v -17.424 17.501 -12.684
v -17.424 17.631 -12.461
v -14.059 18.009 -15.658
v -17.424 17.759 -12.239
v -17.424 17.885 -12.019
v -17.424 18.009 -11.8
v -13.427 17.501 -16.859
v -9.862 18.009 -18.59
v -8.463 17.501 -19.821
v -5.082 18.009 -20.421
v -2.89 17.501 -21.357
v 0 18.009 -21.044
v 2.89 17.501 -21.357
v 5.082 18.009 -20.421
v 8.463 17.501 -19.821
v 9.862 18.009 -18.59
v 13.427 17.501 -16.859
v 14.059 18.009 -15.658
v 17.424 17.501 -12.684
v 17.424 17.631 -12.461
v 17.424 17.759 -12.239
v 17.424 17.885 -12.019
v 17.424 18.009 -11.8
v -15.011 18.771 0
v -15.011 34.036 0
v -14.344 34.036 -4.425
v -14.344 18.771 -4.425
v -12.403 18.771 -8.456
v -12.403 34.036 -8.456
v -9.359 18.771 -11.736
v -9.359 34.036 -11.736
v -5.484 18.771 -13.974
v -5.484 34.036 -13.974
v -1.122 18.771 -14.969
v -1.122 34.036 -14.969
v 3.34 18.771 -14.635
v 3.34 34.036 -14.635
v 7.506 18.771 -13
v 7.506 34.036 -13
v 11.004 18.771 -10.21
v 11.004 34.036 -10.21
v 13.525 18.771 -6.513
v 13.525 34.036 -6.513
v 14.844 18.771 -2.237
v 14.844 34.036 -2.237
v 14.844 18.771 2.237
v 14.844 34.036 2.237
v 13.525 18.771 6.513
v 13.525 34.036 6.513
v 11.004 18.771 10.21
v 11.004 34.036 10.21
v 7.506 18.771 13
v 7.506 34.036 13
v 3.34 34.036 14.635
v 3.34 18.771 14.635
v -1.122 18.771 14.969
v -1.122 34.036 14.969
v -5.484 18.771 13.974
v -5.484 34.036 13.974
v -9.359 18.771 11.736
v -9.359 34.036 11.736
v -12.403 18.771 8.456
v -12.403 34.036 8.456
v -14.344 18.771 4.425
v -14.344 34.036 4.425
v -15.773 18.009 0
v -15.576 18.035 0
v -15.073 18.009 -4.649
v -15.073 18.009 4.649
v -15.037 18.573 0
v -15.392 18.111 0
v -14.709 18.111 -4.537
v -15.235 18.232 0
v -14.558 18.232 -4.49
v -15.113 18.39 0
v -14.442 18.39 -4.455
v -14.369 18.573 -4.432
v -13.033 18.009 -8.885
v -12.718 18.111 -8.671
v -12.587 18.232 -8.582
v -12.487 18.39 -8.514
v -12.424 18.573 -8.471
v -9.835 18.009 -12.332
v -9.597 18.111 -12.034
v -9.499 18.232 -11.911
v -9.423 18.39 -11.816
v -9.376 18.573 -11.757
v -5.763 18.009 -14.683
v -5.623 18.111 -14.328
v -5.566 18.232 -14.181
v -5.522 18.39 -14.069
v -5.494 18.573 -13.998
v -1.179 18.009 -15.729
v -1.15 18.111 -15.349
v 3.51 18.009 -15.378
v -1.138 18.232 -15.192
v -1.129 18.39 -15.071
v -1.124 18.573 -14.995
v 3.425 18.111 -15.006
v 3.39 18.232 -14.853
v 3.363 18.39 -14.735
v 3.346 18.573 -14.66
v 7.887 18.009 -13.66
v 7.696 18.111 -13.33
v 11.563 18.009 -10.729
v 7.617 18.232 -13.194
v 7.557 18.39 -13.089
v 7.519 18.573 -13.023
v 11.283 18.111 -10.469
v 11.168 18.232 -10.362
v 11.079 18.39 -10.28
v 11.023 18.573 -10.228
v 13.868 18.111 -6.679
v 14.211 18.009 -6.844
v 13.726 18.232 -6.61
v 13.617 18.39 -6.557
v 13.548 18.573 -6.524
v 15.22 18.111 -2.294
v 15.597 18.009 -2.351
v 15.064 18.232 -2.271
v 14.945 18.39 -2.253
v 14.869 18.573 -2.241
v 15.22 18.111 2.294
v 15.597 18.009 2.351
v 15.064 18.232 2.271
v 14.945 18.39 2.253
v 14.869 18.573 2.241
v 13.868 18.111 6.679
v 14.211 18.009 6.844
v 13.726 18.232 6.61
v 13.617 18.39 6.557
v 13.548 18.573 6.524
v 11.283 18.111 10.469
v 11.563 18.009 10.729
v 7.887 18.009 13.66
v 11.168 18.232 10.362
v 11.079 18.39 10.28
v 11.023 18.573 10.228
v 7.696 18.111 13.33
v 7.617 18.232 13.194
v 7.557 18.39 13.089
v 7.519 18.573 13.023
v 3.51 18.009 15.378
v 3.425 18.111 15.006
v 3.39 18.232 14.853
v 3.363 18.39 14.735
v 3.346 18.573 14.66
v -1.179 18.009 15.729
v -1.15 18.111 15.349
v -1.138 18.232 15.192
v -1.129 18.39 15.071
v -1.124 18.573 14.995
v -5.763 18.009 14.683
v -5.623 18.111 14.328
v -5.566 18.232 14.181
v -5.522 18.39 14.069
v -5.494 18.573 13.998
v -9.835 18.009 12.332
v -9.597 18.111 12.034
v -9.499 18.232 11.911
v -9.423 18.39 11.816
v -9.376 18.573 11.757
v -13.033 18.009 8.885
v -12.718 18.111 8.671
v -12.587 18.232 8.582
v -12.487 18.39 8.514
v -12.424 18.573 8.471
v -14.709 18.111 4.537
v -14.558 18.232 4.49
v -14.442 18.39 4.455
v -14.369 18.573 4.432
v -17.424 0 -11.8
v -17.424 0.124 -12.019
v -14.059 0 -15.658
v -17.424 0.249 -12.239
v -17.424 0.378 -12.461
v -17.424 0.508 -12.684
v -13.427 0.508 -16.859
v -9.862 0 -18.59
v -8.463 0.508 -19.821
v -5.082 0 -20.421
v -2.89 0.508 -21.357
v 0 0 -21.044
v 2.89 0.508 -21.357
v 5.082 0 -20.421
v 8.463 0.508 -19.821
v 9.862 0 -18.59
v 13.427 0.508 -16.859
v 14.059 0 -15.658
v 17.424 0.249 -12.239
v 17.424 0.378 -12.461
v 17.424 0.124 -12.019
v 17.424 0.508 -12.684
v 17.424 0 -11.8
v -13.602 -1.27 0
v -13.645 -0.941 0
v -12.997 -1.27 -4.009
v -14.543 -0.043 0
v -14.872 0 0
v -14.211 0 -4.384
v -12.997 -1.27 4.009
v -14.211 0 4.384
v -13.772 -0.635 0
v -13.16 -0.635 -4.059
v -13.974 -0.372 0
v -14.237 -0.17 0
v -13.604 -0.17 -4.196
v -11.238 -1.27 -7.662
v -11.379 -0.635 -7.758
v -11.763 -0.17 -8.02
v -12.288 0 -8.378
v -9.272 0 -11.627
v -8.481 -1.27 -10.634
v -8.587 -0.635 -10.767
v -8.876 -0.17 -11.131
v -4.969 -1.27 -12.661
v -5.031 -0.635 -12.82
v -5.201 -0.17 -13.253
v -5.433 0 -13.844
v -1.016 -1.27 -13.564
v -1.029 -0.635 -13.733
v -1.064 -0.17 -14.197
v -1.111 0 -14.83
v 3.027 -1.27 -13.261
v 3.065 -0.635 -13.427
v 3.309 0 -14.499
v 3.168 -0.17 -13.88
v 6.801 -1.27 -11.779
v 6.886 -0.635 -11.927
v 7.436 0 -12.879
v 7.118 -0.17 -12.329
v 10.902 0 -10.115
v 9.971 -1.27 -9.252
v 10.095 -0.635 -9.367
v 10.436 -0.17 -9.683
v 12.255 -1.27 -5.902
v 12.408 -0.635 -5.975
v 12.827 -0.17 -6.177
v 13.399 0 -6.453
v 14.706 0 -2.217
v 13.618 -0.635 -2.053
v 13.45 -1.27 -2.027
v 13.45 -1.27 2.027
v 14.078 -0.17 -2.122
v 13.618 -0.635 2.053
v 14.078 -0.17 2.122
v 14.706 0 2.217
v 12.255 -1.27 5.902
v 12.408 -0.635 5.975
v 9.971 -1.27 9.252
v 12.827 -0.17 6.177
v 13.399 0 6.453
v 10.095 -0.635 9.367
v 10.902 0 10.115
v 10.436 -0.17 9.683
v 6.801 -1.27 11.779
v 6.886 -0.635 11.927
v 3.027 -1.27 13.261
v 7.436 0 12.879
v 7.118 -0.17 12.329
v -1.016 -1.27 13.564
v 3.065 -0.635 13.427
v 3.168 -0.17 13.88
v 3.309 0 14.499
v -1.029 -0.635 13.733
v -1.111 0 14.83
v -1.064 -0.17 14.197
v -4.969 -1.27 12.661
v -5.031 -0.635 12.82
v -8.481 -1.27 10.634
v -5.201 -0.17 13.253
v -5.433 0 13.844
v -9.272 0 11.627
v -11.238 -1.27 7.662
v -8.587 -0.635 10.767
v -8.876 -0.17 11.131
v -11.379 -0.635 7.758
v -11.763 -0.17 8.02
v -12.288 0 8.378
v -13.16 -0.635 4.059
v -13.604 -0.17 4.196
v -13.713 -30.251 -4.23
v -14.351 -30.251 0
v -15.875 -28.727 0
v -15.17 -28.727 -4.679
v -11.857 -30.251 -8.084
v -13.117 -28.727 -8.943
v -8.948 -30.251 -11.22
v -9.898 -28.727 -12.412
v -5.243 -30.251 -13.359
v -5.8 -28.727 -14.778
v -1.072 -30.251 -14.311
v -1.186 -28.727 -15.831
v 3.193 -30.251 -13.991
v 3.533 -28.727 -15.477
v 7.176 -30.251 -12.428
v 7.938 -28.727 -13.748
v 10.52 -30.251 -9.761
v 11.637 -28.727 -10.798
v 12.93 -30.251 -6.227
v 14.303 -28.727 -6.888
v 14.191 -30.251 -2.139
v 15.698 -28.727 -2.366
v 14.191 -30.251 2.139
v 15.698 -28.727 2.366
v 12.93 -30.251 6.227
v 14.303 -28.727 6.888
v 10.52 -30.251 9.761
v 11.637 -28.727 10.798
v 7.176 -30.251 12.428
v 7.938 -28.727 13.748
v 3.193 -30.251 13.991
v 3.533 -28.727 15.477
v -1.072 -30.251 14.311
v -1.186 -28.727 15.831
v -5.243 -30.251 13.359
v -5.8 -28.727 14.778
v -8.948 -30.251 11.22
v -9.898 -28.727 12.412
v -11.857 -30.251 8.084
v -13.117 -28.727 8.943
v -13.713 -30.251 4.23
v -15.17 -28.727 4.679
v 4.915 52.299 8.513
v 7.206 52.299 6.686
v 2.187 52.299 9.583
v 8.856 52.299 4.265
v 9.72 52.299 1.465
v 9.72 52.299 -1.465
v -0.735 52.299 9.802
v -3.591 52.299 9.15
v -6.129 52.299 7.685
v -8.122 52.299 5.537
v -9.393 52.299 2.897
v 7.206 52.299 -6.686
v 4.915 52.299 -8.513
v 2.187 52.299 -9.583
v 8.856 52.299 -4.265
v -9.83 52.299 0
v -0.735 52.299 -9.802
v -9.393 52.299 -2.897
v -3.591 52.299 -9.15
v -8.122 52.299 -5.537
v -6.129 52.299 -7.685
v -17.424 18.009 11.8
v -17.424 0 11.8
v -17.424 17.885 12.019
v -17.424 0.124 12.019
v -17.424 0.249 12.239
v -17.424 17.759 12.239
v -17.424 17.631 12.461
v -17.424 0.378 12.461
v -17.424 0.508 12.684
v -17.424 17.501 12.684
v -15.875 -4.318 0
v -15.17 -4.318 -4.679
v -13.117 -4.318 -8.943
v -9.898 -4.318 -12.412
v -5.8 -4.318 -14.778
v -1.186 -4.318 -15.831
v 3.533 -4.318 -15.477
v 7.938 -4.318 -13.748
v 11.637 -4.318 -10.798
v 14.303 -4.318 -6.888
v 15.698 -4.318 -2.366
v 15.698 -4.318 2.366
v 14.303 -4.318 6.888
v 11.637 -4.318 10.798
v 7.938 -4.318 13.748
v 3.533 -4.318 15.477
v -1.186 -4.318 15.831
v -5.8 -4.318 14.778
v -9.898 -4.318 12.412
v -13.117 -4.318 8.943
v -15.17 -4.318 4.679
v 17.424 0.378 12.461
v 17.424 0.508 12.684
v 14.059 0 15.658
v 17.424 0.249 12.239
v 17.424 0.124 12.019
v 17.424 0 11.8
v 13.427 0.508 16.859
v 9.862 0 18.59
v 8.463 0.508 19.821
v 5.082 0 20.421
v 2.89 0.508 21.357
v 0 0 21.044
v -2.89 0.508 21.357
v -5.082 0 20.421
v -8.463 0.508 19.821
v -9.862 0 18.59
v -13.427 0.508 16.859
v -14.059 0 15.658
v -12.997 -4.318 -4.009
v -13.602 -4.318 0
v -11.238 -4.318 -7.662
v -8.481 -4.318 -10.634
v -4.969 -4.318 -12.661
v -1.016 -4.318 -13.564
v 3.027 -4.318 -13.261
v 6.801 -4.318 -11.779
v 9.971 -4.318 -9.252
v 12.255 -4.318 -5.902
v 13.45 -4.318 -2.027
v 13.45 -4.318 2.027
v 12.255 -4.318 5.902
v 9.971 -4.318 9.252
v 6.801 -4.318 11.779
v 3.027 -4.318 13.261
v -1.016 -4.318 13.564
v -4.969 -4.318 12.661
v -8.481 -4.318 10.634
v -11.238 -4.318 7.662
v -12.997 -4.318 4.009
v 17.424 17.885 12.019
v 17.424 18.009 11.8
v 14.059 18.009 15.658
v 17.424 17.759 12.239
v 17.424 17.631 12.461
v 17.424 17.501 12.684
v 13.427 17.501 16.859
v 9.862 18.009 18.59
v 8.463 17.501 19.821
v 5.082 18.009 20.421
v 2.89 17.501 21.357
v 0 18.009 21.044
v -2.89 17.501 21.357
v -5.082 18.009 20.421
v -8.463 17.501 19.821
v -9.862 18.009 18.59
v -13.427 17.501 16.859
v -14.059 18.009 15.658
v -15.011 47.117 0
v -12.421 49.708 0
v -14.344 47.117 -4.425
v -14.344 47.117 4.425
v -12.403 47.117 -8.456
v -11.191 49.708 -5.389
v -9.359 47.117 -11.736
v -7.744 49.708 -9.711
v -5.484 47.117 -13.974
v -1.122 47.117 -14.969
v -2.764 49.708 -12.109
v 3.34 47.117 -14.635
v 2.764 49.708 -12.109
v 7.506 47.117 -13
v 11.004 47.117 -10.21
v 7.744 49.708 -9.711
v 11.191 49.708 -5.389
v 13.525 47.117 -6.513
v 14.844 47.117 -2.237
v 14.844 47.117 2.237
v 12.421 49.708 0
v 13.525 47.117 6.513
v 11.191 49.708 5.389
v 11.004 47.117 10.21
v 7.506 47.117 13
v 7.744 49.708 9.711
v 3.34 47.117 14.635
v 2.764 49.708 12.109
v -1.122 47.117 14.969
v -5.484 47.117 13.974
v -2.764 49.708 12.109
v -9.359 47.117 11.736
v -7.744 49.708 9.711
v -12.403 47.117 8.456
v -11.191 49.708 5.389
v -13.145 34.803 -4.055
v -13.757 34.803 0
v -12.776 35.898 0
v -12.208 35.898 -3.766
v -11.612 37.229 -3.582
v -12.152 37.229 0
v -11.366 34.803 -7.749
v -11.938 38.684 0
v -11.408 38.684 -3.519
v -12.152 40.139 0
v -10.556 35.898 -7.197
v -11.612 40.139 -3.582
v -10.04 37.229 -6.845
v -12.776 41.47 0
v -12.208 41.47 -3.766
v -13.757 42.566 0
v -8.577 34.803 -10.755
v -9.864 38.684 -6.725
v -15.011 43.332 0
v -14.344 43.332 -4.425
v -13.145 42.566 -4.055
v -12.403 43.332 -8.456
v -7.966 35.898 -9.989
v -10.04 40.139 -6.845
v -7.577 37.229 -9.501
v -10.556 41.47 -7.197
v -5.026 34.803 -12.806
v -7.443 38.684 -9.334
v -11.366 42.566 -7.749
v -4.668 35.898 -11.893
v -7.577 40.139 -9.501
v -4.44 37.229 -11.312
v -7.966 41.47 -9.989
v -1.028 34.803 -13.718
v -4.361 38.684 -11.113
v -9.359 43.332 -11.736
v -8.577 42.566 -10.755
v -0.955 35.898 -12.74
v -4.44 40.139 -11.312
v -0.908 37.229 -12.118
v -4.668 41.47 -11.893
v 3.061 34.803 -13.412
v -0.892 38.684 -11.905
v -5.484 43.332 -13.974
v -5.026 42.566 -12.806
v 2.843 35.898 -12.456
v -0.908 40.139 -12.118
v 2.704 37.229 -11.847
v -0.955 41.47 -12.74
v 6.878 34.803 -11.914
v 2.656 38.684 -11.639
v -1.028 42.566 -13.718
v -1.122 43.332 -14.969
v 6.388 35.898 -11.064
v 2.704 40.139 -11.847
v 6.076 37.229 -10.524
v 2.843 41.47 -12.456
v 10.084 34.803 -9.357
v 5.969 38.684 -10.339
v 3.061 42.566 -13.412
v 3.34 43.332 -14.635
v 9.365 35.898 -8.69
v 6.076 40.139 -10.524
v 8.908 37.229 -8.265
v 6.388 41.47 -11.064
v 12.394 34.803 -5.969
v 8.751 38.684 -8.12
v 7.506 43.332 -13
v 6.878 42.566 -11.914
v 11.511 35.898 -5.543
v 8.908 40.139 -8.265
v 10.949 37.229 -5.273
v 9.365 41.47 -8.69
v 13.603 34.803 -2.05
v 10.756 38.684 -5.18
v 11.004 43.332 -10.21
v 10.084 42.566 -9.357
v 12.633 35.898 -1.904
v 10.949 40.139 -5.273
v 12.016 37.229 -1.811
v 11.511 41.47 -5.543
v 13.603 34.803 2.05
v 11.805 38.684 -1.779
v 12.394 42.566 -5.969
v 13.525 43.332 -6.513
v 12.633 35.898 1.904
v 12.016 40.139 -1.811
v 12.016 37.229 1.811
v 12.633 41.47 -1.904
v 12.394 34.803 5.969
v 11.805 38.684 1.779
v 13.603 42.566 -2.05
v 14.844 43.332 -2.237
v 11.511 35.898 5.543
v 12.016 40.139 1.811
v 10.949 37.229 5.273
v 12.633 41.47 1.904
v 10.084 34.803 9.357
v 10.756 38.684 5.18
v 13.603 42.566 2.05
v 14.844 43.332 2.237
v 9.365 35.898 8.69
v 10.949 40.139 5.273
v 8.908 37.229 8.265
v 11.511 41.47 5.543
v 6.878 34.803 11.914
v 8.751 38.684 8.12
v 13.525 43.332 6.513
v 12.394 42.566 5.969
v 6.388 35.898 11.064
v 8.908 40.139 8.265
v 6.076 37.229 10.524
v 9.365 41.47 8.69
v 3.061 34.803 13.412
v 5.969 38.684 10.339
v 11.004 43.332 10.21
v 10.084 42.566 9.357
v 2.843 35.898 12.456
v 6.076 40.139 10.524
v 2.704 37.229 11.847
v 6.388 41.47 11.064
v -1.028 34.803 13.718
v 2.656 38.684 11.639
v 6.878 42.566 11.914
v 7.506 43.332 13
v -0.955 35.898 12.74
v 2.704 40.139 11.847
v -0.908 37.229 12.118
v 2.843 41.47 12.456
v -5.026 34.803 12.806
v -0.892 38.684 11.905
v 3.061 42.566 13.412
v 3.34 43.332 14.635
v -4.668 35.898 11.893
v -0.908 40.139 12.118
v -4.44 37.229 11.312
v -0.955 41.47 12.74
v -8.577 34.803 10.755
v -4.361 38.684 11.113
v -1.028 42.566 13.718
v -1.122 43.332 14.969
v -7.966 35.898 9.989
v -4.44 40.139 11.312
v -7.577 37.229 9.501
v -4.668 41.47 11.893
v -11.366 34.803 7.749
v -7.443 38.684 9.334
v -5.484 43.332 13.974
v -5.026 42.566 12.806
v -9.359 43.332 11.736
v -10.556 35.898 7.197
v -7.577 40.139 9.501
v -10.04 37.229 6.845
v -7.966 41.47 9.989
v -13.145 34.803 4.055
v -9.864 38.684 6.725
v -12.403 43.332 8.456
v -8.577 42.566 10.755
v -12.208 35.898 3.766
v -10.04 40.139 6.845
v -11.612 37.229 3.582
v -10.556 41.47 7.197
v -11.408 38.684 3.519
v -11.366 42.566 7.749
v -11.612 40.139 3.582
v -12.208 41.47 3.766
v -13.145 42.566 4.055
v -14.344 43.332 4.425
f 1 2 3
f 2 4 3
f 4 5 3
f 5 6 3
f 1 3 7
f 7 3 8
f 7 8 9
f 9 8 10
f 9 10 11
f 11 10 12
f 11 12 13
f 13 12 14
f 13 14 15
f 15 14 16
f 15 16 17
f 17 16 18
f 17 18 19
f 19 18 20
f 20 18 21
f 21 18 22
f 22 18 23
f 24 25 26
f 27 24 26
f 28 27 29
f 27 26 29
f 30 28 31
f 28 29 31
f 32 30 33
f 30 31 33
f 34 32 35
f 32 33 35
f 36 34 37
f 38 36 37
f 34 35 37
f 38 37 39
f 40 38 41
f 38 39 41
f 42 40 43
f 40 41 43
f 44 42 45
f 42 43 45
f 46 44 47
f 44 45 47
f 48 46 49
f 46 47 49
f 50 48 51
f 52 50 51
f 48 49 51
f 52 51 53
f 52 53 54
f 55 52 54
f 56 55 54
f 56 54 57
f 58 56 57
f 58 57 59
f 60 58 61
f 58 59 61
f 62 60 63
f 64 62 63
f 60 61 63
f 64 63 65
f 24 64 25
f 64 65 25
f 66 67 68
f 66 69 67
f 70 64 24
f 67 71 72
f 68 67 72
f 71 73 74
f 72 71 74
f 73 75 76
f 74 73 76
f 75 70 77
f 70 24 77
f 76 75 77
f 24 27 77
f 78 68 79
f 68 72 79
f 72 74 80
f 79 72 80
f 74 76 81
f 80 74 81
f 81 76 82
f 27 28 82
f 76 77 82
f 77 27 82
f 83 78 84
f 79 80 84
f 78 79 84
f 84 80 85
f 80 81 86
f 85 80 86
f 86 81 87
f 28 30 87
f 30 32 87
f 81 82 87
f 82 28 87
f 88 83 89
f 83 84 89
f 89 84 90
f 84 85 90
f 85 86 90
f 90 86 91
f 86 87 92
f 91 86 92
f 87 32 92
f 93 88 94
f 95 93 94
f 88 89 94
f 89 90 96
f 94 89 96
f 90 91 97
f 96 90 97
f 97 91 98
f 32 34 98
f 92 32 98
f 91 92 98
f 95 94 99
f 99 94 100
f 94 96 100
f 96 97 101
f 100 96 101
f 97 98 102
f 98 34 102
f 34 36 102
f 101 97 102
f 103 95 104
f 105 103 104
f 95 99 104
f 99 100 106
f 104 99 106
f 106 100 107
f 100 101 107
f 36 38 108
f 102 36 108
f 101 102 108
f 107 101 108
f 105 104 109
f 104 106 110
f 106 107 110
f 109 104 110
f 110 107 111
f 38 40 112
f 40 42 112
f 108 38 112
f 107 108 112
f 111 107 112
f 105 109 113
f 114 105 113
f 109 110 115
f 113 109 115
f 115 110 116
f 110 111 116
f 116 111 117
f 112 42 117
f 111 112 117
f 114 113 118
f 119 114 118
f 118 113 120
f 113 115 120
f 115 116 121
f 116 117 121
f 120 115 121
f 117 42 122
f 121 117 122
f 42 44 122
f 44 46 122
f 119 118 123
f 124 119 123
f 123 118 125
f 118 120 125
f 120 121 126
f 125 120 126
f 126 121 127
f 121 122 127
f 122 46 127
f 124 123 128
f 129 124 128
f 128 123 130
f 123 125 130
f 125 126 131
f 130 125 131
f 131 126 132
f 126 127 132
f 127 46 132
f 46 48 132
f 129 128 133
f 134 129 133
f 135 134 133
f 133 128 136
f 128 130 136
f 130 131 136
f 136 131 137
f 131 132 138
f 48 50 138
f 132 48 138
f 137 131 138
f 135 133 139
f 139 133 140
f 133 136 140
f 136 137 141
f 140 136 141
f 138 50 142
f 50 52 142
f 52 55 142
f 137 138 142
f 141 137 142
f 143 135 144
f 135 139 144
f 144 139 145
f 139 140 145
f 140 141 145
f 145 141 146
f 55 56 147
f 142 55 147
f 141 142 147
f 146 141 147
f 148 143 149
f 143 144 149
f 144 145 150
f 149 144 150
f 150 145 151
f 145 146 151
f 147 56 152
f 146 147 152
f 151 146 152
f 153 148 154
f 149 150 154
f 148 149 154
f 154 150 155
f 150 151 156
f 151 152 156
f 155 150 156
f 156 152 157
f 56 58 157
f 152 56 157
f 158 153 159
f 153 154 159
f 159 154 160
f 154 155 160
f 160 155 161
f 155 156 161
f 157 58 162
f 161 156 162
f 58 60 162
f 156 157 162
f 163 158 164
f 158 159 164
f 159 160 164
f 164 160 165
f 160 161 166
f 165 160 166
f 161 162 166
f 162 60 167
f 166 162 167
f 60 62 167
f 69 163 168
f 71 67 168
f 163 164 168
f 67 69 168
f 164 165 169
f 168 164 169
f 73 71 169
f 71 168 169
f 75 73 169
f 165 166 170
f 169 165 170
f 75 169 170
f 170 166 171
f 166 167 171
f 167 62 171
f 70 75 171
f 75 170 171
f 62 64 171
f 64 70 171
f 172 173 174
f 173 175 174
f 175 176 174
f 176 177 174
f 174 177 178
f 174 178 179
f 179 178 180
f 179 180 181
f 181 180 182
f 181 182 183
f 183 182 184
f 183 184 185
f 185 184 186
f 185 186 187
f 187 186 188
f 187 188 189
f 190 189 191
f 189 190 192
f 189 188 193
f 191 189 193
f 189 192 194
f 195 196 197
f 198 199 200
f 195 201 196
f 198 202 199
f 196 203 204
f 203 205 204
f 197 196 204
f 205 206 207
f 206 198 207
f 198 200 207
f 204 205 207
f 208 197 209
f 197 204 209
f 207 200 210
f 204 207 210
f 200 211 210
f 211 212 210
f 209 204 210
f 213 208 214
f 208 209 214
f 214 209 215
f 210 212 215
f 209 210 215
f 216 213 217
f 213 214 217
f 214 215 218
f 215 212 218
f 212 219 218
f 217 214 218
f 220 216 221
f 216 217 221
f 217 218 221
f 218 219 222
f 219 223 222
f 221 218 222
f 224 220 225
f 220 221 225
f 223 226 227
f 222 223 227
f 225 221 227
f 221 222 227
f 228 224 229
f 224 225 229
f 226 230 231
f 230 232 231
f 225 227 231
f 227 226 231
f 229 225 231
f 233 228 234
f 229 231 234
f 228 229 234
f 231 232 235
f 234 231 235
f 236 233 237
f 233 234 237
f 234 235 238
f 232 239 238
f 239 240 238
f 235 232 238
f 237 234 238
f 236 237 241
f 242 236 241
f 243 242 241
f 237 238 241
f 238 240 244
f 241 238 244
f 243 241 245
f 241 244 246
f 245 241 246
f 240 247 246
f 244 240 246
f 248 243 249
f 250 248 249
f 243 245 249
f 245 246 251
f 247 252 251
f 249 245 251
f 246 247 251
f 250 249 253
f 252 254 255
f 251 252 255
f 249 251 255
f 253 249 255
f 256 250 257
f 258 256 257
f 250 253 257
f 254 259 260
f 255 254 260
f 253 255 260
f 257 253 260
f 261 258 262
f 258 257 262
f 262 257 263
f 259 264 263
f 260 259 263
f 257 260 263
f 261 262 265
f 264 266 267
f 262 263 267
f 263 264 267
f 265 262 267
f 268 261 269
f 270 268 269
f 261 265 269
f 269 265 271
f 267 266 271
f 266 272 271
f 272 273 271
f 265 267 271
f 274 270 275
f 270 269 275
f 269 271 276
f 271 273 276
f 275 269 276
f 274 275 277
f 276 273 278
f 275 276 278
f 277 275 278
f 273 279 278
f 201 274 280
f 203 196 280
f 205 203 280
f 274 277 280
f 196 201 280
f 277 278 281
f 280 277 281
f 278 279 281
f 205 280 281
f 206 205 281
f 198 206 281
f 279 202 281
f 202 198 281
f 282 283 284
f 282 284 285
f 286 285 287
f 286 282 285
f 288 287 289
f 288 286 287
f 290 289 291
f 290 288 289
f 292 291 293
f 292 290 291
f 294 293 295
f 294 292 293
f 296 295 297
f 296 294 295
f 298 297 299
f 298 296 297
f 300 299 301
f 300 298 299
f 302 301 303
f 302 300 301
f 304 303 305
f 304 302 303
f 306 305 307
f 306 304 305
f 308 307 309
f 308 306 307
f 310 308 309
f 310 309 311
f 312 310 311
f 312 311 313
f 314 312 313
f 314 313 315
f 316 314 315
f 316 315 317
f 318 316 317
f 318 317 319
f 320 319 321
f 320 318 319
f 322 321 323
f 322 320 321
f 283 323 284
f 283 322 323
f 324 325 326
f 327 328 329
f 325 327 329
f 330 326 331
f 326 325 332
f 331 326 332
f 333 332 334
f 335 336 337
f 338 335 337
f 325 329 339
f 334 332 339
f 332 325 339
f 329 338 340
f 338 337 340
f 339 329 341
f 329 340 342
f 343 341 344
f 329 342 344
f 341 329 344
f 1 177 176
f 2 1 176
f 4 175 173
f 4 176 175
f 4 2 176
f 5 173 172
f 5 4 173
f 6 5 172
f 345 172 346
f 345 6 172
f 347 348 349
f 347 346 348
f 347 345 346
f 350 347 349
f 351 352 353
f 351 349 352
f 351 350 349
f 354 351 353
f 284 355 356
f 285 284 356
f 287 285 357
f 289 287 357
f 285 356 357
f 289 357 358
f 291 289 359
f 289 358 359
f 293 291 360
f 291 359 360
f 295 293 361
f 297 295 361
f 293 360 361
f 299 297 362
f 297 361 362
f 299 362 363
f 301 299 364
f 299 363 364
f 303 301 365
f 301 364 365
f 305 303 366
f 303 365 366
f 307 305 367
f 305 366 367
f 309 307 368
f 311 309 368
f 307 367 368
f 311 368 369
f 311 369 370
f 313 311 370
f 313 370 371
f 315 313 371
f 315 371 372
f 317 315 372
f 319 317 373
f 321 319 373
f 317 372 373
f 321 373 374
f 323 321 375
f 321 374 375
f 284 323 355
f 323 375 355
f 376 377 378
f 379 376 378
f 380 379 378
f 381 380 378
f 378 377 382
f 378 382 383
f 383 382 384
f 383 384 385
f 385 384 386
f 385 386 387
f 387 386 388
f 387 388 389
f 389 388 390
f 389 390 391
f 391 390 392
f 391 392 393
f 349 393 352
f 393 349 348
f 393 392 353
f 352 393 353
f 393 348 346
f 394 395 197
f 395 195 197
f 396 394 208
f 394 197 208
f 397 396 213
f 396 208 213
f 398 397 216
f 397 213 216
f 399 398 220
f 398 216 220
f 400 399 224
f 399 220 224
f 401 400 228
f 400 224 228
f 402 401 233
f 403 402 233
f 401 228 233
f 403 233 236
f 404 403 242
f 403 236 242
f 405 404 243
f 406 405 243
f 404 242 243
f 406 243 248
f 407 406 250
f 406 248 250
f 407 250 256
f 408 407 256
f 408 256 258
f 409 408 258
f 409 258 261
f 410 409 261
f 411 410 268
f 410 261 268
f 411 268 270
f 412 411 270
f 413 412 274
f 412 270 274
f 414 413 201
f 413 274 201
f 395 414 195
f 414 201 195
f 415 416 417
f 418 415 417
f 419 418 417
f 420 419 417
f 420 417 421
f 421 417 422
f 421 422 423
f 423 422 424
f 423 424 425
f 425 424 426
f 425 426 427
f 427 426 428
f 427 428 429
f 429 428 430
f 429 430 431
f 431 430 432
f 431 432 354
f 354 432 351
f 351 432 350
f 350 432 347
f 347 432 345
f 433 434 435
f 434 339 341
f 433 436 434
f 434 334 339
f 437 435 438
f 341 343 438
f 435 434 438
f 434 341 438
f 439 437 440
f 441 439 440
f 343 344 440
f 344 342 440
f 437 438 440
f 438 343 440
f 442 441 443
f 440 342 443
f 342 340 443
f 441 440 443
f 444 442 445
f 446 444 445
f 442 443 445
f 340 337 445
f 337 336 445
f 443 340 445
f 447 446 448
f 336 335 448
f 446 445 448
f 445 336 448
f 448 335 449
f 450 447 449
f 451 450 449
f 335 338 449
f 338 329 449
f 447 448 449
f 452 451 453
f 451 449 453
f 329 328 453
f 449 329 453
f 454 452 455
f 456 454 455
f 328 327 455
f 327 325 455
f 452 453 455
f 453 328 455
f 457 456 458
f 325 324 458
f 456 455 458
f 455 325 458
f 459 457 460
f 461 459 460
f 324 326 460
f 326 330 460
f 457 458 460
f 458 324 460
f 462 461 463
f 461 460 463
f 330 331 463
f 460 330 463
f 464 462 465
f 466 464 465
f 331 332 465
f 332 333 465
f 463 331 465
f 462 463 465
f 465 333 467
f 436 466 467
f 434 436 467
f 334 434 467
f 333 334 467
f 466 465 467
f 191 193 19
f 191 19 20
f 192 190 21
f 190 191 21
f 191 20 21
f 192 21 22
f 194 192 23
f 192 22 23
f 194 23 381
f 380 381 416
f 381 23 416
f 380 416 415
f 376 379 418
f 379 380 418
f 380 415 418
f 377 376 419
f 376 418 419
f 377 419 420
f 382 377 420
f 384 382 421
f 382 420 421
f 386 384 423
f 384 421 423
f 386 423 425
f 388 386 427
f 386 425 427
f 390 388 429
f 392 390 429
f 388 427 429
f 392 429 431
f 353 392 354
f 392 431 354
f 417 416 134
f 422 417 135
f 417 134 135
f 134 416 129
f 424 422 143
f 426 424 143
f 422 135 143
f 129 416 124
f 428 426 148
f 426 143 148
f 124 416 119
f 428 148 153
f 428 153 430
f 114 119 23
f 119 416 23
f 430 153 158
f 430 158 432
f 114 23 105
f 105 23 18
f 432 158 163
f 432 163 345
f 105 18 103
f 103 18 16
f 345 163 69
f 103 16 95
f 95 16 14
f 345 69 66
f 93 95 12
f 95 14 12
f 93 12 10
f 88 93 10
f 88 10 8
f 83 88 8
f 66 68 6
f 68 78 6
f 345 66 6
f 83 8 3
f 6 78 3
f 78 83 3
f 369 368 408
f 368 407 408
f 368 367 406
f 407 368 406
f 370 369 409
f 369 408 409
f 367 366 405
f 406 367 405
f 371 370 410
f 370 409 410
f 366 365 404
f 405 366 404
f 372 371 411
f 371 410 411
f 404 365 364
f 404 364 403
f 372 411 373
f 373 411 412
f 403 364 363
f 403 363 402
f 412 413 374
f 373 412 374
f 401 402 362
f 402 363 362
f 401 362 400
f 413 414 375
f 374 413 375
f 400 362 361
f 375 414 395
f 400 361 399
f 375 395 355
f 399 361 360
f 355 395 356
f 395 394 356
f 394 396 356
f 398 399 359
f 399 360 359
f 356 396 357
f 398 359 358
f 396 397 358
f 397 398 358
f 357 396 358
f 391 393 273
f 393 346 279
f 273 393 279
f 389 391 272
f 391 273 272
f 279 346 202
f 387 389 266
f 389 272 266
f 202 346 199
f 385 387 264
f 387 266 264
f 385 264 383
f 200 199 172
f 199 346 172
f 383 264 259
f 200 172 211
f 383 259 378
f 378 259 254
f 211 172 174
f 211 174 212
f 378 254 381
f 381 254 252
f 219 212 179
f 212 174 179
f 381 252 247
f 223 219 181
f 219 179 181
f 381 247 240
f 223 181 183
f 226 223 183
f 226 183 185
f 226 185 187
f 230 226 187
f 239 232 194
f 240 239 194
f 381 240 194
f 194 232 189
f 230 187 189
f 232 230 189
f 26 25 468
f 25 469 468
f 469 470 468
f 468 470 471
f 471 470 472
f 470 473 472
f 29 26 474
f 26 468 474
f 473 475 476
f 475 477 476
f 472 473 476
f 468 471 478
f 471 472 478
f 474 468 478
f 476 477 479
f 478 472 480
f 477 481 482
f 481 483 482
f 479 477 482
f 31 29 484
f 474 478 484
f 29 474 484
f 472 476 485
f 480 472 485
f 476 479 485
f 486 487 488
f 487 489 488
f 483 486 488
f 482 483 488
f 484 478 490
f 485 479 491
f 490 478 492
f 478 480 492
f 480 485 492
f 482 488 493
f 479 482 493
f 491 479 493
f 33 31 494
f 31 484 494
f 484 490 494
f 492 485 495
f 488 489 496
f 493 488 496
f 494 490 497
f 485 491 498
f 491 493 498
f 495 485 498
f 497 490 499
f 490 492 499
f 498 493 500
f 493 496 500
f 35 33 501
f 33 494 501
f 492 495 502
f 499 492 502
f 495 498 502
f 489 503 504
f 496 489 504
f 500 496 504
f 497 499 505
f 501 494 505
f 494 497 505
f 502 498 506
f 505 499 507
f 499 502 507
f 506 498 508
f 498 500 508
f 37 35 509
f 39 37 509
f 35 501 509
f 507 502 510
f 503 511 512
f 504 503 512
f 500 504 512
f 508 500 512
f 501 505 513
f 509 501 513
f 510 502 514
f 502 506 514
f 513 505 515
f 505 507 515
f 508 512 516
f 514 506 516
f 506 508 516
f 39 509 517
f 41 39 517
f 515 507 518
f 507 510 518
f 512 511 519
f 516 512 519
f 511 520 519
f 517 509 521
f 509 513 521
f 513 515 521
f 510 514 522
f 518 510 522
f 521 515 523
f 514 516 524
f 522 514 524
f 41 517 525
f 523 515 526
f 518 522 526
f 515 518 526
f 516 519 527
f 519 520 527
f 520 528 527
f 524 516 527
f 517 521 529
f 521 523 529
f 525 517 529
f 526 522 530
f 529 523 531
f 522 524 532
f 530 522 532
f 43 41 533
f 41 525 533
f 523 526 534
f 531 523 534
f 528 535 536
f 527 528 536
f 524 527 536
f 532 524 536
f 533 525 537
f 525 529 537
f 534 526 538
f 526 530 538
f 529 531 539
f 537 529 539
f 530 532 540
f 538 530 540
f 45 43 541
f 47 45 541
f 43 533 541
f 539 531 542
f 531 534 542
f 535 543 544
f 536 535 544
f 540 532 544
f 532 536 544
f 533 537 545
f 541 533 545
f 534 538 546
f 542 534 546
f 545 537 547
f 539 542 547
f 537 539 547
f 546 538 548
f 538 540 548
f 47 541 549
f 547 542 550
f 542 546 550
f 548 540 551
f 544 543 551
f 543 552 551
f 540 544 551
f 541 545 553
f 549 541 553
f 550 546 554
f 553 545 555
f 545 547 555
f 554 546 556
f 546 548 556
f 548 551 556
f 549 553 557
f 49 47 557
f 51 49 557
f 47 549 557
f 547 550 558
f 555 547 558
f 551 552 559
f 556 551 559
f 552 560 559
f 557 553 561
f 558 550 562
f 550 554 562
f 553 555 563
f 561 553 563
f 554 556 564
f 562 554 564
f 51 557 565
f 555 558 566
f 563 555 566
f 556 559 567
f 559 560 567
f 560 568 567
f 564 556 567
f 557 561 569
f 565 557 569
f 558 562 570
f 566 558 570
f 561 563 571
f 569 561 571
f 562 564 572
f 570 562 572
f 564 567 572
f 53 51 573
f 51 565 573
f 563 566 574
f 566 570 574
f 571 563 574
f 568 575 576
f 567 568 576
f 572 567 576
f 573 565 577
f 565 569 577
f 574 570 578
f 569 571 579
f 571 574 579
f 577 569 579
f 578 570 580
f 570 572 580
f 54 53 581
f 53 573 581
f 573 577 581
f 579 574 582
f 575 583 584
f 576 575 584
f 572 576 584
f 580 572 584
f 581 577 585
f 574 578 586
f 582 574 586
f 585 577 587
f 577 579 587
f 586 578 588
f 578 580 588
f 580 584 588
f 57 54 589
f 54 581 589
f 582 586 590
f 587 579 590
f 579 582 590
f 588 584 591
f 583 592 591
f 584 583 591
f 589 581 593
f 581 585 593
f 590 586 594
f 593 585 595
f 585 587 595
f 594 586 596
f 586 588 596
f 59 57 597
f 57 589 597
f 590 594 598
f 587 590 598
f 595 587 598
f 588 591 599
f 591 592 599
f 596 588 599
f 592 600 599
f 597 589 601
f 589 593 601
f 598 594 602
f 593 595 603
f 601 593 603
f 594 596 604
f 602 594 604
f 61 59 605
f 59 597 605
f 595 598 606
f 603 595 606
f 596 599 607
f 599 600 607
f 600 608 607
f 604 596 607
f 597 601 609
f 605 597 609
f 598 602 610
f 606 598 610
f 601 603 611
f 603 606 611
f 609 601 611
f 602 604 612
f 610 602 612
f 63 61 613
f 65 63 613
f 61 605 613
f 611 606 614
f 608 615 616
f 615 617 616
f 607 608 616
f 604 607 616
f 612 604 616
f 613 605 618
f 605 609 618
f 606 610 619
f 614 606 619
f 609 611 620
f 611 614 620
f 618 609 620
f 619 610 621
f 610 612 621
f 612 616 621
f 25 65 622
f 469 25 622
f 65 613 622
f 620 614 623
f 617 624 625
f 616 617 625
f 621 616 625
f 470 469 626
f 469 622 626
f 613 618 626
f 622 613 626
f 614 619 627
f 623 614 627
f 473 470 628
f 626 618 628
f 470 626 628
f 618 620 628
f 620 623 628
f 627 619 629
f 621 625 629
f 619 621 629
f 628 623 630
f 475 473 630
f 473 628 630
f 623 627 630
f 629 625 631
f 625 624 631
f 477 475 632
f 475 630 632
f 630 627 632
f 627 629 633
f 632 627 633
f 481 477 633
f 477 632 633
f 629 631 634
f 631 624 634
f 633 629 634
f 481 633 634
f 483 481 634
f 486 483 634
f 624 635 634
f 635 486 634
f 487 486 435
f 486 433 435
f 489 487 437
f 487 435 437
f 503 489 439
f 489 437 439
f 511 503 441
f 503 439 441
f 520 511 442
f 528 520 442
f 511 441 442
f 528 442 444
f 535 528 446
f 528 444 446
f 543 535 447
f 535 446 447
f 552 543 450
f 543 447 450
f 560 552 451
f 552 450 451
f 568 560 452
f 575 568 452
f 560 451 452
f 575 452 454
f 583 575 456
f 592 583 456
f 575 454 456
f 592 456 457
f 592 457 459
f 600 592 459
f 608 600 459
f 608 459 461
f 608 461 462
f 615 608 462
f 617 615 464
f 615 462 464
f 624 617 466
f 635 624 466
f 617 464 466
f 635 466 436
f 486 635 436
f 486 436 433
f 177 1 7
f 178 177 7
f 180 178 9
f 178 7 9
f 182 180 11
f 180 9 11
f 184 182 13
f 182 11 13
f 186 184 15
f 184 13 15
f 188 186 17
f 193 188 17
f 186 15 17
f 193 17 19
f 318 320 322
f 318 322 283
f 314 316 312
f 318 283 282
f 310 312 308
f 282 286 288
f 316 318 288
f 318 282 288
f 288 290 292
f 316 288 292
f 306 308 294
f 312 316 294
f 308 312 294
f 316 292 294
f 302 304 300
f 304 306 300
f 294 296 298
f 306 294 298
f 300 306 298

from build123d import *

# Parameters (mm, degrees)
CHAMFER1_SIZE      = 0.508
CHAMFER2_SIZE      = 1.524
CUT_EXTRUDE1_DEPTH = 49.26
FILLET1_R          = 0.762


with BuildPart() as part:
    # Sketch1 → Revolve1 (revolve)
    with BuildSketch(Plane.XY):
        with BuildLine():
            Line((0, 52.2986), (0, -30.2514))
            Line((0, -30.2514), (-15.875, -30.2514))
            Line((-15.875, -30.2514), (-15.875, -4.318))
            Line((-15.875, -4.318), (-13.6017, -4.318))
            Line((-13.6017, -4.318), (-13.6017, -1.27))
            ThreePointArc((-13.6017, -1.27), (-13.973674388, -0.371974388), (-14.8717, 0))
            Line((-14.8717, 0), (-21.5519, 0))
            Line((-21.5519, 0), (-21.5519, 18.0086))
            Line((-21.5519, 18.0086), (-15.0114, 18.0086))
            Line((-15.0114, 18.0086), (-15.0114, 34.036))
            ThreePointArc((-15.0114, 34.036), (-11.938, 38.6842), (-15.0114, 43.3324))
            Line((-15.0114, 43.3324), (-15.0114, 47.117))
            Line((-15.0114, 47.117), (-9.8298, 52.2986))
            Line((-9.8298, 52.2986), (0, 52.2986))
        make_face()
    revolve(axis=Axis((0, -30.2514, 0), (0, -1, 0)))

    # Chamfer1
    chamfer1_edges = [part.edges().sort_by_distance(p)[0] for p in [
        (21.5519, 18.0086, 0),
        (21.5519, 0, 0),
    ]]
    chamfer(chamfer1_edges, length=CHAMFER1_SIZE)

    # Chamfer2
    chamfer2_edges = [part.edges().sort_by_distance(p)[0] for p in [
        (15.875, -30.2514, 0),
    ]]
    chamfer(chamfer2_edges, length=CHAMFER2_SIZE)

    # Sketch2 → Cut-Extrude1 (cut, through all)
    with BuildSketch(Plane(origin=(0, 18.0086, 0), x_dir=(1, 0, 0), z_dir=(0, 1, 0))):
        with BuildLine():
            Line((-17.4244, 12.68363821), (-17.4244, -12.68363821))
            ThreePointArc((-17.4244, -12.68363821), (-21.5519, 0), (-17.4244, 12.68363821))
        make_face()
        with BuildLine():
            Line((17.4244, 12.68363821), (17.4244, -12.68363821))
            ThreePointArc((17.4244, -12.68363821), (21.5519, 0), (17.4244, 12.68363821))
        make_face()
    extrude(amount=-CUT_EXTRUDE1_DEPTH, mode=Mode.SUBTRACT)

    # Fillet1
    fillet1_edges = [part.edges().sort_by_distance(p)[0] for p in [
        (15.0114, 18.0086, 0),
    ]]
    fillet(fillet1_edges, radius=FILLET1_R)


solid = part.part
